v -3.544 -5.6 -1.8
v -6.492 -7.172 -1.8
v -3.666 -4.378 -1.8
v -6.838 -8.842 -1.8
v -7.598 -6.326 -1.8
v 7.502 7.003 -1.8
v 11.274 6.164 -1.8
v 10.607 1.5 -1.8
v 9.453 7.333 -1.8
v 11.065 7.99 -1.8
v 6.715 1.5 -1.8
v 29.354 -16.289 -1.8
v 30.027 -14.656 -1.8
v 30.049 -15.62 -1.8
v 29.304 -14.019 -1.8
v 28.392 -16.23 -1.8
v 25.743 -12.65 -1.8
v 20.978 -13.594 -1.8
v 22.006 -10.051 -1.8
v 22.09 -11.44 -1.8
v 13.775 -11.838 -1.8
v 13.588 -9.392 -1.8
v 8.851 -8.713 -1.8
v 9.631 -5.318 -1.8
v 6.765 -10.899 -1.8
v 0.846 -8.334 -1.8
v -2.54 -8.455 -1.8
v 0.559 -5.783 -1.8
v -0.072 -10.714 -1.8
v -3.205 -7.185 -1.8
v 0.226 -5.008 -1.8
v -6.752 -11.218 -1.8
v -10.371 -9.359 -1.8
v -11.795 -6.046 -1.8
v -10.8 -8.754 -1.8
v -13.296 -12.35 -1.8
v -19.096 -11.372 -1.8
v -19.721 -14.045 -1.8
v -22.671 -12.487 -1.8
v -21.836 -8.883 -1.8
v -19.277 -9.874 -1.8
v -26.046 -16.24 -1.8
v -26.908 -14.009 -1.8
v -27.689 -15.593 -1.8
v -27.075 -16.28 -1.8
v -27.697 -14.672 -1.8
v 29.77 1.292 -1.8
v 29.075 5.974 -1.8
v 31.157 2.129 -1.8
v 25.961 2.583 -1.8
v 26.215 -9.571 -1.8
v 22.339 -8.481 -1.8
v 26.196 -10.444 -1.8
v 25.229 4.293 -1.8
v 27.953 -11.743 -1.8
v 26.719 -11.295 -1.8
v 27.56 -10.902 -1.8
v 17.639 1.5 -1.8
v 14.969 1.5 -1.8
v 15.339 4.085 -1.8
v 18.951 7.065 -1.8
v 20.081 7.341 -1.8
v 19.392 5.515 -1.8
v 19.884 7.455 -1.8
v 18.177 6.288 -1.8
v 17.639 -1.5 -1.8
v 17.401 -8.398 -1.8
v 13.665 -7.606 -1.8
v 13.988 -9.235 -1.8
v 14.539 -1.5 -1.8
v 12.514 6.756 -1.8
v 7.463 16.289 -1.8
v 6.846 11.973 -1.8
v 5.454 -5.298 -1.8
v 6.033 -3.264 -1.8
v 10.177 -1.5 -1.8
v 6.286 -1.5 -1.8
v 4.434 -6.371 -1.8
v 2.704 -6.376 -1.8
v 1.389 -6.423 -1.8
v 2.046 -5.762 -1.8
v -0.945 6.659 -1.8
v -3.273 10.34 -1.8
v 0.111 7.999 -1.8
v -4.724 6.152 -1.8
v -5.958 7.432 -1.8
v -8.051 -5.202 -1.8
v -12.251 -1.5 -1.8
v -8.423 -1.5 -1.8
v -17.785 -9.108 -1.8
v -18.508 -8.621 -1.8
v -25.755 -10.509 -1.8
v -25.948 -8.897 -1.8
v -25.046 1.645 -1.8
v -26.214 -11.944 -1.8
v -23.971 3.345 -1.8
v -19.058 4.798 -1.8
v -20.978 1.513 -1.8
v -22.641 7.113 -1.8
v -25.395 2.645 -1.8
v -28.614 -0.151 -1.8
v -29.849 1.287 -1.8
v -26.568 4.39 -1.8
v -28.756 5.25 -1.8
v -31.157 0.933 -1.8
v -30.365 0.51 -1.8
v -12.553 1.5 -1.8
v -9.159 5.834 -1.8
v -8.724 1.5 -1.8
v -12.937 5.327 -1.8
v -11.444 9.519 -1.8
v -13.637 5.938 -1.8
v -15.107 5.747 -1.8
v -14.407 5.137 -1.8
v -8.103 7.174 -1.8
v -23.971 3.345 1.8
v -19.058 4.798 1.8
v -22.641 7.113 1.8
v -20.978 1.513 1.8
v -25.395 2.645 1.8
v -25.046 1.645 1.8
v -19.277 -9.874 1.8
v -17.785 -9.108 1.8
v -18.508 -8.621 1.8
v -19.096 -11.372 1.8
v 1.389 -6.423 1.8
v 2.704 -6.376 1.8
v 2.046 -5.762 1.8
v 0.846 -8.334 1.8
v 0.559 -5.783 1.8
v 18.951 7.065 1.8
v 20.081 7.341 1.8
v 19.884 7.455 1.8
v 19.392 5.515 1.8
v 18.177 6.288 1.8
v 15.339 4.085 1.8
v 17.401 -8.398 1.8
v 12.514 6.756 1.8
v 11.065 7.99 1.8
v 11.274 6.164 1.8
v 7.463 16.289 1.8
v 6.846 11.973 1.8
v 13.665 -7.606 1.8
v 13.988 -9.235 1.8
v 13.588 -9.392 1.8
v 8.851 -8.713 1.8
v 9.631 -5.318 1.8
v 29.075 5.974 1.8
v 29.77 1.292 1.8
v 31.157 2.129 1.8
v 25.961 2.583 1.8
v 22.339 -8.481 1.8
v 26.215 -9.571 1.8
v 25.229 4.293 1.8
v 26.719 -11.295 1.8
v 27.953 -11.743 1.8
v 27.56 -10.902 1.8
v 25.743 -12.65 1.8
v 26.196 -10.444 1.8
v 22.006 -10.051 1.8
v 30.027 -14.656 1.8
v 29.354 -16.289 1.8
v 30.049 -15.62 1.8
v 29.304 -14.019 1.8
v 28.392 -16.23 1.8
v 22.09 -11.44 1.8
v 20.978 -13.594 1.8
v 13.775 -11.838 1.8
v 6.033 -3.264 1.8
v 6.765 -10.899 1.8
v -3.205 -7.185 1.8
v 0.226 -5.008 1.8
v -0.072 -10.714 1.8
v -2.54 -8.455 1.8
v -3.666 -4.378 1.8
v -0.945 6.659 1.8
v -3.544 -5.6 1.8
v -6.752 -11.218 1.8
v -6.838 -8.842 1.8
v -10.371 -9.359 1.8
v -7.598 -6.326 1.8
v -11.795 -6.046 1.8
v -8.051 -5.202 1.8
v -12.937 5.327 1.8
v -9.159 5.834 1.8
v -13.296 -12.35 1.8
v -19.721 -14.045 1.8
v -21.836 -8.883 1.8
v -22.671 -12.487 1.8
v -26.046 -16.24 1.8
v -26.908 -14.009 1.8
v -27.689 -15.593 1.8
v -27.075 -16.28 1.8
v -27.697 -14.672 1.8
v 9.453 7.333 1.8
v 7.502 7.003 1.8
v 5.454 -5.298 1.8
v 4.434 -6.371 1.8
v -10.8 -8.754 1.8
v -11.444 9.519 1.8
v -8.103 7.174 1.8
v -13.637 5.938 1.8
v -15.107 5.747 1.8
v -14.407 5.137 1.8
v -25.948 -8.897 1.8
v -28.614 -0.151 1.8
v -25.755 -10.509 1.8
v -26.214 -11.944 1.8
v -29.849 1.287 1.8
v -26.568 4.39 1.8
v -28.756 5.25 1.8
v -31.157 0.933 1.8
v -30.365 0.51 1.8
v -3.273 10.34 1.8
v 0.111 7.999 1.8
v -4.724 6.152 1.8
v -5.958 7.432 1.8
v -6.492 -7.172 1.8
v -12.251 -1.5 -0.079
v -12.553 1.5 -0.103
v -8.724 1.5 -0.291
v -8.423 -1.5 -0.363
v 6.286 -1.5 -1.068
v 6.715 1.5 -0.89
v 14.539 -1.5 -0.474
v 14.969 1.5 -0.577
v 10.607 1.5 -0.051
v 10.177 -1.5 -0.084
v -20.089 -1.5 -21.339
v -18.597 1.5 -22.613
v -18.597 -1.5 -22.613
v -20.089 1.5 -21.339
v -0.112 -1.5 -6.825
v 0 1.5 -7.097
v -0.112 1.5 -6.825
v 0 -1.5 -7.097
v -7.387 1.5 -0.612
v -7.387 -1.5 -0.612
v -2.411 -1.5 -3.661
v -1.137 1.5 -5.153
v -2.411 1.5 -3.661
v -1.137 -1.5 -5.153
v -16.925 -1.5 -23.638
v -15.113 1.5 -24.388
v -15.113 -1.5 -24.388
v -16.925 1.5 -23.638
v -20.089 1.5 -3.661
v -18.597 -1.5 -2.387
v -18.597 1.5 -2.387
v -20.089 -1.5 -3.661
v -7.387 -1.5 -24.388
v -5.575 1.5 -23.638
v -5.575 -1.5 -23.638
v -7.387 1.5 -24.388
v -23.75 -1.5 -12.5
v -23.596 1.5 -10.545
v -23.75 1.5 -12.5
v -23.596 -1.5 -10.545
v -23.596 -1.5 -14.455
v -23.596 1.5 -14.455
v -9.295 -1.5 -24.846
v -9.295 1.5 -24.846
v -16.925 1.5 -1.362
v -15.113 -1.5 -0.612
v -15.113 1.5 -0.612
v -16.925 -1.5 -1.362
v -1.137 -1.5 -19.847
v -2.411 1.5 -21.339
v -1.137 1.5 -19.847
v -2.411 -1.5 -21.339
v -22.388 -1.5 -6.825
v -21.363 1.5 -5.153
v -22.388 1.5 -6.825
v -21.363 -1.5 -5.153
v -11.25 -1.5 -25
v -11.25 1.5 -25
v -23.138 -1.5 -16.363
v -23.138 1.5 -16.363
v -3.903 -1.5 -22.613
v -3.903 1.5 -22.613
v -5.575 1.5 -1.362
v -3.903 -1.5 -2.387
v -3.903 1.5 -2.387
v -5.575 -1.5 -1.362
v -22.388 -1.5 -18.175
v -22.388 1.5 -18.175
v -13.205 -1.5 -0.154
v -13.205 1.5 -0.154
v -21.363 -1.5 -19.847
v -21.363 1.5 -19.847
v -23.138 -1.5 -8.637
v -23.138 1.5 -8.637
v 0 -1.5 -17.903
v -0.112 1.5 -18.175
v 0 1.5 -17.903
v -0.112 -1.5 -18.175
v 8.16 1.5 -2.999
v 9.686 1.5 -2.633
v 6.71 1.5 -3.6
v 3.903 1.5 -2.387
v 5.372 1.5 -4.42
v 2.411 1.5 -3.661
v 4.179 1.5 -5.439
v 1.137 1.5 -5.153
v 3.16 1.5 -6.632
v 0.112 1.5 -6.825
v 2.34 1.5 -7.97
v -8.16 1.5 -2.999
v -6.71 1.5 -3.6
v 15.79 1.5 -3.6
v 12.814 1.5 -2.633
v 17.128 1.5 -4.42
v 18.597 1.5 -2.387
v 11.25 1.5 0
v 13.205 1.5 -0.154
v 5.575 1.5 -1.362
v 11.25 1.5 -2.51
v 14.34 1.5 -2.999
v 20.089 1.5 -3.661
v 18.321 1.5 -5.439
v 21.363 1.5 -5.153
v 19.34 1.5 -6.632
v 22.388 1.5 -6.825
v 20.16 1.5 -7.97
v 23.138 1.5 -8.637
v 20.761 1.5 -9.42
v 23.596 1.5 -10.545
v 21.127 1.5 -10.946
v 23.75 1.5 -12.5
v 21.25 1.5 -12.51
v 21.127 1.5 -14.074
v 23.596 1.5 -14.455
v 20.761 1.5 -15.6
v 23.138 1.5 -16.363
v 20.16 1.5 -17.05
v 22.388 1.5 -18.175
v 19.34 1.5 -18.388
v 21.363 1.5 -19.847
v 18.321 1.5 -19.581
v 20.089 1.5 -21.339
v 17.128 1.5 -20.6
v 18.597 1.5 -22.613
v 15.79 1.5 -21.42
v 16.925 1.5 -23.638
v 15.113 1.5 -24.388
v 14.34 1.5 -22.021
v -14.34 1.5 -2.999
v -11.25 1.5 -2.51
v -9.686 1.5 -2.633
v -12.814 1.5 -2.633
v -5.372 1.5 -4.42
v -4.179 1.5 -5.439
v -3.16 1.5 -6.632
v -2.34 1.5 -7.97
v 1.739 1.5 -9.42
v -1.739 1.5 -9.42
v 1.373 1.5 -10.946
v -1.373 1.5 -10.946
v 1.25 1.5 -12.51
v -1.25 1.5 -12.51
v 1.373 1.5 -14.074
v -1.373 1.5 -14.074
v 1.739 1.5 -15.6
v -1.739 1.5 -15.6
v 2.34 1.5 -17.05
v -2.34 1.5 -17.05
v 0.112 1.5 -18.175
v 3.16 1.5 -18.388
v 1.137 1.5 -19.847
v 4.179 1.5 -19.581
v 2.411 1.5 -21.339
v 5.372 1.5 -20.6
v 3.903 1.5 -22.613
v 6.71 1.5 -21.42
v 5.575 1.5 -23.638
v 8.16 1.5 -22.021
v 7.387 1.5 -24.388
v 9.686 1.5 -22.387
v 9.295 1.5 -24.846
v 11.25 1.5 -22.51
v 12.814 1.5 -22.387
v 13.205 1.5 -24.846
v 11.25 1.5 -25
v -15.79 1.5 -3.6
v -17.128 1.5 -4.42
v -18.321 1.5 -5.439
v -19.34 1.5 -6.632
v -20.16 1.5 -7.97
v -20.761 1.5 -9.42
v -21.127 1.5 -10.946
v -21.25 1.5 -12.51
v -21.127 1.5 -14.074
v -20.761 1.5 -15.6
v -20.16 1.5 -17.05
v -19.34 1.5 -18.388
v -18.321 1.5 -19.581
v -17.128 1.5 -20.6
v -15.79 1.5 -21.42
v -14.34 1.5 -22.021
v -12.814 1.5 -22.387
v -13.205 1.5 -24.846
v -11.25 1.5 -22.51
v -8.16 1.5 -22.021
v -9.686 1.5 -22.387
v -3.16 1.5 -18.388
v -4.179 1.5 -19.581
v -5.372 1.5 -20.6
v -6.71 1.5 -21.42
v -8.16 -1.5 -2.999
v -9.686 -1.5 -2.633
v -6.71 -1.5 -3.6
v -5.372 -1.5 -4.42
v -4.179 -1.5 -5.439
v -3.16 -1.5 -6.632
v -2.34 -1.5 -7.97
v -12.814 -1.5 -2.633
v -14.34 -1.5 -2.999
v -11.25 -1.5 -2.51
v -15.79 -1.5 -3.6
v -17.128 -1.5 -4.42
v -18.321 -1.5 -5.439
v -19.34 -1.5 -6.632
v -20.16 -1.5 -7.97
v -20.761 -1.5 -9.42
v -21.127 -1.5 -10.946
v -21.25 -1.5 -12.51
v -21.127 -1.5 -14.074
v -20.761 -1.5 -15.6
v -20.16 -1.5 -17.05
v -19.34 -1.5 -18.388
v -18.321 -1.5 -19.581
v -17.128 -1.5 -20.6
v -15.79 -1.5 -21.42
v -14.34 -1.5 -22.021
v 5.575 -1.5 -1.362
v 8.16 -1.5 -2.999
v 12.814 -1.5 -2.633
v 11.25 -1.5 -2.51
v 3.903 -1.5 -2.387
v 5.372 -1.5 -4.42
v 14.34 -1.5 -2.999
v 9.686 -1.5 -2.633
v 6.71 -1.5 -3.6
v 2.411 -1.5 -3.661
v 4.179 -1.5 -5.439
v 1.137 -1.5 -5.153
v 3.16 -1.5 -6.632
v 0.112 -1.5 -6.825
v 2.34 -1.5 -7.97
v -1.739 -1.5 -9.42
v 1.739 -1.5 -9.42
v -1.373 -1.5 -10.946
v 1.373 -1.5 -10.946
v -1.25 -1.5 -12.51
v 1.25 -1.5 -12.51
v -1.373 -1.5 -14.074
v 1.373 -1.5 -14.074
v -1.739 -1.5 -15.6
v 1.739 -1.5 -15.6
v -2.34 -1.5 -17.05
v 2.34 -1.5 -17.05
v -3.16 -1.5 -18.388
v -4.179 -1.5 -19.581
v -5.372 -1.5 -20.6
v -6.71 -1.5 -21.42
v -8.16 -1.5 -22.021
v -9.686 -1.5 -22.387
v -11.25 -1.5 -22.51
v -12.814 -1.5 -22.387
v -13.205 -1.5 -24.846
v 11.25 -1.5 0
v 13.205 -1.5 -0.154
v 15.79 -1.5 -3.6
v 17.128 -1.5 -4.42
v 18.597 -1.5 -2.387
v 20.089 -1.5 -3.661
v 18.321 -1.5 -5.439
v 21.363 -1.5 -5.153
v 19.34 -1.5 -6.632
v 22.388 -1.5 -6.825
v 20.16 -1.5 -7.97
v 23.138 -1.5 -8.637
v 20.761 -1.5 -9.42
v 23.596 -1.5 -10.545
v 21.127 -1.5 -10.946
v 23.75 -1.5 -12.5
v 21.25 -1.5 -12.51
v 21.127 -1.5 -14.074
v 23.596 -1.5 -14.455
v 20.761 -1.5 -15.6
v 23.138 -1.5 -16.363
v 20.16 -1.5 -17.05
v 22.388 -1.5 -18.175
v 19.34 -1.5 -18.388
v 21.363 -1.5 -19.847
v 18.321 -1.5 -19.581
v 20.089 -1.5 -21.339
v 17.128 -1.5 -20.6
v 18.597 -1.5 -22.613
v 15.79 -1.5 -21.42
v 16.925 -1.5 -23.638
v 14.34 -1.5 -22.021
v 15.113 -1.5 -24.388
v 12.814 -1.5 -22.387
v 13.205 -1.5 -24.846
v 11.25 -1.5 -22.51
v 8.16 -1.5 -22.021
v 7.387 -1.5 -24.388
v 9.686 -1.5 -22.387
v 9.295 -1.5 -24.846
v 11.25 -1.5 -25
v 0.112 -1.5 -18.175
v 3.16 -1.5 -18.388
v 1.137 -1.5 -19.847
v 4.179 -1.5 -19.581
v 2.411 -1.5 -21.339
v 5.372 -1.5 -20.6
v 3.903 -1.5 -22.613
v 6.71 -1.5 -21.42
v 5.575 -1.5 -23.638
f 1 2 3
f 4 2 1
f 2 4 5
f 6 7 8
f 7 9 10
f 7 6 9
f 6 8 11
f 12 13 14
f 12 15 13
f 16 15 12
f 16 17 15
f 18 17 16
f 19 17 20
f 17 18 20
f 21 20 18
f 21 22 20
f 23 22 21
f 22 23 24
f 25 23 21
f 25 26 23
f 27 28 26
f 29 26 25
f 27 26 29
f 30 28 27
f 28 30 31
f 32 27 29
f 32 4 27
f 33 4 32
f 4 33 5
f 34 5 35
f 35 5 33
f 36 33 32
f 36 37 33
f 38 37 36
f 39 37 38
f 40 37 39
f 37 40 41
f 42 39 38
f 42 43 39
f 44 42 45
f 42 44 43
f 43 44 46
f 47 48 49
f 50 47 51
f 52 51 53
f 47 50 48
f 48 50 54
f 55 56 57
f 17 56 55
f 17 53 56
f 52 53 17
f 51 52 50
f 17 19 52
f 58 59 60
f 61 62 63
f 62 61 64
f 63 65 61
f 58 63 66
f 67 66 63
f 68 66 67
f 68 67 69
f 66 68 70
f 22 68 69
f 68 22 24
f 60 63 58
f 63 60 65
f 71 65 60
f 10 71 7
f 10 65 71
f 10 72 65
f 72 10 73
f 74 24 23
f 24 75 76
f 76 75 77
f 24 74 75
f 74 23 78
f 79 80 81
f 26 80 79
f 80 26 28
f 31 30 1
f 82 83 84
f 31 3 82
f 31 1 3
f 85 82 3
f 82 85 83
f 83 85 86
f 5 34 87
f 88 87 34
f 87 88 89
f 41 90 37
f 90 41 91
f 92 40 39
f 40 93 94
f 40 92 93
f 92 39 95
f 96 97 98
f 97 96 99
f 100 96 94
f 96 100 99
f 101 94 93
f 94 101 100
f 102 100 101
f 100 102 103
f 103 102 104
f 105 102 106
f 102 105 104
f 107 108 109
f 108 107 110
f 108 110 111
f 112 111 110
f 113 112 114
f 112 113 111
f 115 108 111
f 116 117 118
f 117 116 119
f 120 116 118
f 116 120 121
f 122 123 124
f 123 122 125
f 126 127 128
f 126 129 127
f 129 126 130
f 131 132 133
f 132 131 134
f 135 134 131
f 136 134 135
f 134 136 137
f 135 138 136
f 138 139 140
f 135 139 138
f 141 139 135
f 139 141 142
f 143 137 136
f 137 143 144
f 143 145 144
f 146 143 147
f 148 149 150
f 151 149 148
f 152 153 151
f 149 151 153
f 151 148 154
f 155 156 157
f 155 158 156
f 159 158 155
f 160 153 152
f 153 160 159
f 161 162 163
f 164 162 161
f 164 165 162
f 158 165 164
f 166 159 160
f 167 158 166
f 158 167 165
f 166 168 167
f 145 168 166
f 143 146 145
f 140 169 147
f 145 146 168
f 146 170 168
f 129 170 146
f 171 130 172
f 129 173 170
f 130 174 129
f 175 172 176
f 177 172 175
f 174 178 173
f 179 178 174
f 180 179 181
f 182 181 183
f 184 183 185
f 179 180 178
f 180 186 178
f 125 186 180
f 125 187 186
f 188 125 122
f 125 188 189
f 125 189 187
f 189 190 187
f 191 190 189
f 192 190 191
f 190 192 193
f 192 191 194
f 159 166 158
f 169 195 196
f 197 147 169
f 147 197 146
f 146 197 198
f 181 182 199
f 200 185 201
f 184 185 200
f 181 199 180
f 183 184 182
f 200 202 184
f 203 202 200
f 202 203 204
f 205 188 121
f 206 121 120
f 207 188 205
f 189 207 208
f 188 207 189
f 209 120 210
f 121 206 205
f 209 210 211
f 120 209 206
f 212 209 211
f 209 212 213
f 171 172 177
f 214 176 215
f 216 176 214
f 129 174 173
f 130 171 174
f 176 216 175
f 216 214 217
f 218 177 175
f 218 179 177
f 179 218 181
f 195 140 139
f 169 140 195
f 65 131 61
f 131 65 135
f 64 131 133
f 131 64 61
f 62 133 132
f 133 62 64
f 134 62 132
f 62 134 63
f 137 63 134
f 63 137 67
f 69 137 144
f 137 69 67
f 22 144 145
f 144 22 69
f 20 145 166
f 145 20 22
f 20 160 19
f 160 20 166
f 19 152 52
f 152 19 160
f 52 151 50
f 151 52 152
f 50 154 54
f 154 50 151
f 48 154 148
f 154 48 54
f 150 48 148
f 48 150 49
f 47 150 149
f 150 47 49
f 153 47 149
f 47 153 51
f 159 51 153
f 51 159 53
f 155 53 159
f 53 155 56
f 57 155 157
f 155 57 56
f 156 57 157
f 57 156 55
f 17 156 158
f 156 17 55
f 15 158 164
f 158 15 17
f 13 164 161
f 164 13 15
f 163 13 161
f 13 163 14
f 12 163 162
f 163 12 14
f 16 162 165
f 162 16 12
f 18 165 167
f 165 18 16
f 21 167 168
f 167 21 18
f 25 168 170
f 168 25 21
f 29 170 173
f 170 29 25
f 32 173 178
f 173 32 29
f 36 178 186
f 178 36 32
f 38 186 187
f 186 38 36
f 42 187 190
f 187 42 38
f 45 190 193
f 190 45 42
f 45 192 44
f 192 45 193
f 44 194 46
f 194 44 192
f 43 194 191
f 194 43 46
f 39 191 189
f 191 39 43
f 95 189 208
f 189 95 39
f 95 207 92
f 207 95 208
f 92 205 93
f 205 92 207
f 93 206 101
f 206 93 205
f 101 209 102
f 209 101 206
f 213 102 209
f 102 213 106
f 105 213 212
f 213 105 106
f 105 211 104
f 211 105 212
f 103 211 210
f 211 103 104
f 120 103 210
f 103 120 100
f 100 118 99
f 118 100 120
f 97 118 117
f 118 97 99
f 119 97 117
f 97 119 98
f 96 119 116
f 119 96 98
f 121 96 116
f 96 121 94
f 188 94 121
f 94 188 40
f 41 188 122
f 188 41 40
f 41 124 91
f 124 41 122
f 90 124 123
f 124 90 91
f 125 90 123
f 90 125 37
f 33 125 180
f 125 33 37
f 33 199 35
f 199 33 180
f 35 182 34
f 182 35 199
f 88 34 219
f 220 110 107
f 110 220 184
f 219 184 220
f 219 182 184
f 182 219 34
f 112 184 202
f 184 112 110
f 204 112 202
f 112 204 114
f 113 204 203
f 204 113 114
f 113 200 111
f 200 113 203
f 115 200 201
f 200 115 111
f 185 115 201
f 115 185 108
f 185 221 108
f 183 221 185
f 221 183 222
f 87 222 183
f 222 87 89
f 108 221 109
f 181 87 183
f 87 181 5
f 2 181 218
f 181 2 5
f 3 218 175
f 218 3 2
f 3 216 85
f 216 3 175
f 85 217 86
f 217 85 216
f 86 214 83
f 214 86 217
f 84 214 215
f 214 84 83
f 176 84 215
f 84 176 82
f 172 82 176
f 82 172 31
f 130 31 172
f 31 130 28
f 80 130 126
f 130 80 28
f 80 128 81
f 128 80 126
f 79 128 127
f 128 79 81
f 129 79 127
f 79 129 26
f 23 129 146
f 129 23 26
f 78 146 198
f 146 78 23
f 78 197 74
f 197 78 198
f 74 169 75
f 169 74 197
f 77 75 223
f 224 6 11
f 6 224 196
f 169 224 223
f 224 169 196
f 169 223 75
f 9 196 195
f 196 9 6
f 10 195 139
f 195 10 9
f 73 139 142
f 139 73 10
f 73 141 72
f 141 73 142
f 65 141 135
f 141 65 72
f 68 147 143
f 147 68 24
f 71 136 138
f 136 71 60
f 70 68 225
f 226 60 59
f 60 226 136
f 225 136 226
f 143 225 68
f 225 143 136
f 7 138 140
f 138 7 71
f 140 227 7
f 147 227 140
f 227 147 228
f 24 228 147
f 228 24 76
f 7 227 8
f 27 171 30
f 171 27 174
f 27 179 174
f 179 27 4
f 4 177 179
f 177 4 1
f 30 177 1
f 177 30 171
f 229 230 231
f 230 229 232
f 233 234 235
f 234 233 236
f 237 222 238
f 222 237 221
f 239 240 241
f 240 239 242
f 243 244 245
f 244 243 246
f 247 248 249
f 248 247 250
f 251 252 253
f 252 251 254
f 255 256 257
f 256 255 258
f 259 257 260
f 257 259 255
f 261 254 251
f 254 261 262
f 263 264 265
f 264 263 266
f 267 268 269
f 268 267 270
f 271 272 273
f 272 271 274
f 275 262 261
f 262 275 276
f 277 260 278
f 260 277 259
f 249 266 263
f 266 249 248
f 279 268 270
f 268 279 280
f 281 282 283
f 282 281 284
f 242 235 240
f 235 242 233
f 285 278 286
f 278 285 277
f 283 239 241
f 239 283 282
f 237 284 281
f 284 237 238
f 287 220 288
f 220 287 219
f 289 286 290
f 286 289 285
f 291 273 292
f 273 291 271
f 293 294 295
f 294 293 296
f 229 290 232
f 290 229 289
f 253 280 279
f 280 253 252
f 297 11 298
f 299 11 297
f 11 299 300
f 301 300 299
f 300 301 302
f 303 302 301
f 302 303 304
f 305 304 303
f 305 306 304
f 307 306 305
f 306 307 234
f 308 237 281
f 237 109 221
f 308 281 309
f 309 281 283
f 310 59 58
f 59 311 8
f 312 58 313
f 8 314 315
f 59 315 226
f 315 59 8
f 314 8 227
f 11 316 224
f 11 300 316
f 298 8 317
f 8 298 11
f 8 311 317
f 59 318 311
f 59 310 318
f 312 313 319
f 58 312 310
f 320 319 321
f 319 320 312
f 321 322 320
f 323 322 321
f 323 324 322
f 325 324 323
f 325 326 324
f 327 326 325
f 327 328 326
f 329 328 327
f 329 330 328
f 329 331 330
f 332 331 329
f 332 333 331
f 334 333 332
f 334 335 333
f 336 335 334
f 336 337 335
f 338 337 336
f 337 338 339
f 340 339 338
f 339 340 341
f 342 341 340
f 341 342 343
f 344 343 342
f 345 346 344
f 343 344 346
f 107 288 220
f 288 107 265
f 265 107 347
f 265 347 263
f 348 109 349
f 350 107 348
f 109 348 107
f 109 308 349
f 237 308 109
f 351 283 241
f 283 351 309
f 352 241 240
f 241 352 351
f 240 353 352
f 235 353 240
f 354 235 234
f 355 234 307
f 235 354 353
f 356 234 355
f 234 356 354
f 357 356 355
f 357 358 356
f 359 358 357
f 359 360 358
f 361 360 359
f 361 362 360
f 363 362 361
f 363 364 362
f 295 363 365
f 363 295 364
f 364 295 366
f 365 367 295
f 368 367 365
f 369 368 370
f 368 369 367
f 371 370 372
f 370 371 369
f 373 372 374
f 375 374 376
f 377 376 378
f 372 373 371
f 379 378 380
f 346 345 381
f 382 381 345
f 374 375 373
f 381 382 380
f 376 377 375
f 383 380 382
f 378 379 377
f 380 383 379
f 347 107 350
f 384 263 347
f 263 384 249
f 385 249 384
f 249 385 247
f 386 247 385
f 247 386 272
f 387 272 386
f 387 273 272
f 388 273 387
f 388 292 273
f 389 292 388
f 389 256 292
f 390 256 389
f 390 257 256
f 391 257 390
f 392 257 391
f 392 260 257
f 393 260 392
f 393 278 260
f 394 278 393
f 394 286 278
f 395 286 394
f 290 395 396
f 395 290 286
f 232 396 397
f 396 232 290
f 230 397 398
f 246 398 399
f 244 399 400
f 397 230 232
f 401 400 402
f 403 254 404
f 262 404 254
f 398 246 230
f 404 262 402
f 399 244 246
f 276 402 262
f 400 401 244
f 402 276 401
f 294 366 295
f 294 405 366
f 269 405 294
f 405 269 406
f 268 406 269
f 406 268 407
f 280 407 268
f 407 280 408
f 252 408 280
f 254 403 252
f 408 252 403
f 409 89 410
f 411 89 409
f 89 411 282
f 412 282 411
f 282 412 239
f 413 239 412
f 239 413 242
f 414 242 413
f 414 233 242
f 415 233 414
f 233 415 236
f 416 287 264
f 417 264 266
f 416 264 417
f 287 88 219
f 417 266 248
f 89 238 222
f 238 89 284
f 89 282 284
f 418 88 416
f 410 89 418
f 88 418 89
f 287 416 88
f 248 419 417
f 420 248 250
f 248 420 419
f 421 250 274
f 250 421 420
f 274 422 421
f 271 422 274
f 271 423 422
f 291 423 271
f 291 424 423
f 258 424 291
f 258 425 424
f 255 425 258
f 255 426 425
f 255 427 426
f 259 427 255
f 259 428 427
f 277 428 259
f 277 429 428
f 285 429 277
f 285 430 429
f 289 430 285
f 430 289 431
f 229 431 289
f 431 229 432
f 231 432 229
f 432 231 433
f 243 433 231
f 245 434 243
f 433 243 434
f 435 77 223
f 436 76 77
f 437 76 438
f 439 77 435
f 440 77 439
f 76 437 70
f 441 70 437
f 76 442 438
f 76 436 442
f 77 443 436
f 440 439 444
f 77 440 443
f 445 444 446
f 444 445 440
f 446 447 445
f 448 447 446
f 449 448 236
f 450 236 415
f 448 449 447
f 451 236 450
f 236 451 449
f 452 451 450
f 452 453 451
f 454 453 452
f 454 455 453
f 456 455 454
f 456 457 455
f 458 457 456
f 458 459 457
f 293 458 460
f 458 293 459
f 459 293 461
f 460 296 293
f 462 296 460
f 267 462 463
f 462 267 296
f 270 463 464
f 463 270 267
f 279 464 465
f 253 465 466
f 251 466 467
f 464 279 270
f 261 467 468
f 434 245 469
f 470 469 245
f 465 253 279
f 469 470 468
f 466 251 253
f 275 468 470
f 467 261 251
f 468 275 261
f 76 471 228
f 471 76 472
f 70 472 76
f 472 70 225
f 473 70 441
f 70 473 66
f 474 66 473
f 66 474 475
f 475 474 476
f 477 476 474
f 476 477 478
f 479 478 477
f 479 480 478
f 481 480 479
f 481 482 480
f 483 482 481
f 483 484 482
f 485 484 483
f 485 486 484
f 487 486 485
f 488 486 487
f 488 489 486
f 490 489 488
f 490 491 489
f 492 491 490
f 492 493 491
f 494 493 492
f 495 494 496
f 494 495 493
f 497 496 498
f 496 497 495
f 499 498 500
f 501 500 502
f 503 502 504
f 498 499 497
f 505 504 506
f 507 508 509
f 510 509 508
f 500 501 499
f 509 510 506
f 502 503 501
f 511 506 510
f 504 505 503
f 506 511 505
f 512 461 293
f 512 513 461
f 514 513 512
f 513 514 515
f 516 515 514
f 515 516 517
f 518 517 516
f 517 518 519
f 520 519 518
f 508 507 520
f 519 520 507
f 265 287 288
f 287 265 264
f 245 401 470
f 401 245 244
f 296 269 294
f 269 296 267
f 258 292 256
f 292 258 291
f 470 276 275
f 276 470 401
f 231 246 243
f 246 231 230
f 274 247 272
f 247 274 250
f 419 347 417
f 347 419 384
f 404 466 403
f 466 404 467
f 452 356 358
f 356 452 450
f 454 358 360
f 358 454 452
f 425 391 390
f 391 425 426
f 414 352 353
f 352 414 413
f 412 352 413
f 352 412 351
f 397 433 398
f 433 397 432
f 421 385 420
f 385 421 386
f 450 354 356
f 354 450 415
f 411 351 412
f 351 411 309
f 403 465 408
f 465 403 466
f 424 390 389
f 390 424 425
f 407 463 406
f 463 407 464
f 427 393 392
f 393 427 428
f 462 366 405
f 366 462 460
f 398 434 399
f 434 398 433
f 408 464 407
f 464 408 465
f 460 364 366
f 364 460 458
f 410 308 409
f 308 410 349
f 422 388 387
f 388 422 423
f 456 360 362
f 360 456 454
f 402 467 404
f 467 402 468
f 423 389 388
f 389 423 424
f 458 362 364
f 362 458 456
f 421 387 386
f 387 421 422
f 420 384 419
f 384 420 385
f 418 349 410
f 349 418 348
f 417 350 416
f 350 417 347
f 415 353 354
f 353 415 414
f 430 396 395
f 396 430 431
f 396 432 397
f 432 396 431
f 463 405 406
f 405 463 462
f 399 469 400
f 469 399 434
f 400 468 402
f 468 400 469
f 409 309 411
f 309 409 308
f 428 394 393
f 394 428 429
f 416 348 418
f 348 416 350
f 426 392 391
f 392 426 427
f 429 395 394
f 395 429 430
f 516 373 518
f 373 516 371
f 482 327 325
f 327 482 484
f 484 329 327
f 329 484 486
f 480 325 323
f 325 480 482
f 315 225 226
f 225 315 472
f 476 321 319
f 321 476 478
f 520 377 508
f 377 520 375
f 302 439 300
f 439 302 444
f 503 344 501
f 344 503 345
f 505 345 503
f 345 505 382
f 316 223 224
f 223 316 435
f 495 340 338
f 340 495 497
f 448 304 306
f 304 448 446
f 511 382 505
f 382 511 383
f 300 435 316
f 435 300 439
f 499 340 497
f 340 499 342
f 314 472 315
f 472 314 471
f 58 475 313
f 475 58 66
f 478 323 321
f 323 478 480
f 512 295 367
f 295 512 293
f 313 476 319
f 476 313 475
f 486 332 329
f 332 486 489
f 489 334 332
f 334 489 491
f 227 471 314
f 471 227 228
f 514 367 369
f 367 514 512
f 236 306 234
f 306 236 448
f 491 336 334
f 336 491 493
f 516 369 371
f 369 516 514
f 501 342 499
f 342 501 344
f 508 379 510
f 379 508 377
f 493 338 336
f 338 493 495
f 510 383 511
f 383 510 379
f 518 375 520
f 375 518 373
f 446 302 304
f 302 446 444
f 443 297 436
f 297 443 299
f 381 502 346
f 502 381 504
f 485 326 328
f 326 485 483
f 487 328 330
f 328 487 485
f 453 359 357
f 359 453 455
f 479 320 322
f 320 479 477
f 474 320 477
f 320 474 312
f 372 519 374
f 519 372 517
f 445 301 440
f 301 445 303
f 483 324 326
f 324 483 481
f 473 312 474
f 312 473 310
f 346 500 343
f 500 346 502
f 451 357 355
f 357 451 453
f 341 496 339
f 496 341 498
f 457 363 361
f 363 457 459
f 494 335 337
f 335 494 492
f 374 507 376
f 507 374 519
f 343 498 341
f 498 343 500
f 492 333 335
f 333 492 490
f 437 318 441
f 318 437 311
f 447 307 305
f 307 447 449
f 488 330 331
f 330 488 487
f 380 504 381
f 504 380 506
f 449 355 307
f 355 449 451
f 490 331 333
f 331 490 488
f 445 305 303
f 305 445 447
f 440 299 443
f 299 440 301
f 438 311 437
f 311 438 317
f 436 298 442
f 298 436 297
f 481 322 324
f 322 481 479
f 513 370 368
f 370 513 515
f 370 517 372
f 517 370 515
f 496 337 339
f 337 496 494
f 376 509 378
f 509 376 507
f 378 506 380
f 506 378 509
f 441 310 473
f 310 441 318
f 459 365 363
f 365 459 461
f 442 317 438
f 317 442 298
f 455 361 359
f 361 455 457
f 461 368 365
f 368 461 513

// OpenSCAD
fw = 20; // finger width
rw = 25; // ring width
rh = 5; // ring height
th = 3; // text height

slack = 0.1;

// ------------------------------

rt = (rw-fw)/2; // ring thickness

$fn = 40;
e = 0.01;


module ring(h) {
    rotate([90, 0, 0])
    difference() {
        cylinder(d=rw, h=h, center = true);
        translate([0, -e, 0])
        cylinder(d=fw, h=h+2*e, center = true);
    }
}

//snap()
full()
//csumi(th)
rudi(th);

module full() {
    scale(1.2)
    children();
    translate([-rw/2+rt/2, 0, -rw/2])
    ring(th);
    translate([rw/2-rt/2, 0, -rw/2])
    ring(th);
}

module snap() {
    difference() {
        scale(1.2)
        children();
        translate([-rw/2+rt/2, 0, -rw/2])
        ring(th+2*slack);
        translate([rw/2-rt/2, 0, -rw/2])
        ring(th+2*slack);
    }
}

module rings_snap() {
    translate([-rw/2+rt/2, 0, -rw/2])
    ring(th);
    translate([rw/2-rt/2, 0, -rw/2])
    ring(th);
}


fudge = 0.1;
module csumi(h=3)
{
    translate([0, 0, -h/2])
  scale([1, -1, 1]) union()
  {
    difference()
    {
       linear_extrude(height=h)
         polygon([[-13.610023,-12.008821],[-13.884425,-12.004693],[-14.504789,-11.729996],[-14.679209,-11.072968],[-14.480255,-10.673508],[-14.101466,-10.264232],[-13.727846,-9.889061],[-13.538710,-9.559882],[-13.922046,-8.552732],[-15.287440,-8.065915],[-17.438703,-8.162474],[-19.821014,-8.885504],[-21.341798,-6.978378],[-23.423379,-5.383910],[-22.643581,0.135135],[-19.163173,1.567089],[-22.032766,7.341930],[-25.455296,8.111910],[-23.636802,5.596299],[-24.217129,5.204594],[-25.311119,6.704760],[-28.335224,6.056738],[-30.965555,-3.719927],[-27.659296,-2.563925],[-26.824205,-5.163250],[-30.829128,-6.606574],[-32.178269,-4.526426],[-34.013431,-2.826958],[-31.630113,6.030382],[-31.460622,7.610520],[-31.905549,8.807992],[-28.865941,9.011081],[-32.384073,10.082850],[-33.025774,10.608346],[-33.053909,11.352883],[-32.592096,11.937568],[-31.763955,11.983508],[-23.792830,9.766351],[-15.797137,8.296937],[-7.777492,7.518585],[0.265491,7.374610],[8.331194,7.808330],[16.419002,8.763062],[24.528301,10.182122],[32.658473,12.008828],[33.461765,11.884950],[33.869250,11.277091],[33.791106,10.549471],[33.137514,10.066313],[30.731975,9.489087],[32.463652,8.575447],[32.070913,7.908821],[31.404287,8.302079],[30.902113,7.638238],[30.847731,6.911982],[32.929258,-2.382540],[34.013431,-3.188178],[31.978412,-6.210733],[28.922268,-4.509026],[29.666408,-3.149419],[27.546640,6.317704],[27.394715,7.637978],[27.570400,8.776985],[23.403212,7.925873],[25.336946,6.644298],[24.886845,6.015396],[24.257425,6.465498],[23.701009,5.831296],[23.589765,5.060415],[24.767989,-3.822247],[25.753459,-5.079533],[26.507934,-5.940464],[26.122944,-6.525442],[24.547847,-5.381841],[22.685945,-7.977549],[19.871128,-6.073271],[17.972020,-4.901768],[17.572583,-7.054278],[16.409840,-8.952166],[11.217911,-5.762180],[11.260026,-7.002152],[11.003519,-8.103826],[10.448419,-9.067173],[9.594753,-9.892162],[6.500368,-7.490758],[6.915846,-6.866506],[7.575238,-7.277332],[7.962684,-6.576445],[8.023789,-5.829876],[6.794924,3.437775],[5.641504,4.352448],[6.769603,5.683117],[2.731087,5.455223],[4.298953,4.081665],[3.800790,3.520976],[3.204962,4.019652],[2.565186,3.425141],[2.348167,2.756679],[2.269617,-7.014818],[3.249404,-8.045761],[0.621138,-10.247177],[-1.830906,-8.040594],[-0.904349,-6.883558],[-0.833551,1.935542],[-3.392051,4.037223],[-4.245099,3.250471],[-4.535136,2.282808],[-4.609032,-6.960041],[-3.629764,-7.990985],[-6.222887,-10.192400],[-9.551367,-7.343478],[-9.017548,-6.783307],[-8.316815,-7.388439],[-7.783516,-6.828265],[-7.707035,2.696219],[-7.088469,5.019592],[-6.826986,5.477962],[-13.740775,6.026766],[-11.300098,4.517812],[-12.218388,-1.979466],[-15.713265,-3.516322],[-14.247205,-6.253106],[-13.731990,-7.145559],[-12.814679,-9.288046],[-12.594075,-10.940160],[-12.904024,-11.713885],[-13.610034,-12.008828]]);
       translate([0, 0, -fudge])
         linear_extrude(height=h+2*fudge)
           polygon([[13.919047,-6.542486],[14.619647,-5.586564],[14.785145,-4.754998],[13.579015,4.337470],[12.495877,5.261445],[13.413651,6.342517],[9.502778,5.914635],[10.707873,5.059907],[9.951332,3.785049],[11.092347,-4.818043]]);
       translate([0, 0, -fudge])
         linear_extrude(height=h+2*fudge)
           polygon([[-15.410430,-5.910484],[-17.827337,-1.079771],[-19.821531,-1.831146],[-20.394623,-5.883094],[-18.905852,-5.434376],[-17.401523,-5.379767],[-15.410430,-5.910484]]);
       translate([0, 0, -fudge])
         linear_extrude(height=h+2*fudge)
           polygon([[20.365682,-5.509473],[21.583696,-3.960216],[20.419426,4.817546],[20.393225,6.239441],[20.721734,7.433404],[16.366959,6.738357],[17.496609,5.924970],[16.740580,4.650112],[17.895550,-4.057884]]);
       translate([0, 0, -fudge])
         linear_extrude(height=h+2*fudge)
           polygon([[-17.039272,-0.799167],[-15.035259,0.021972],[-14.378452,4.667683],[-16.168583,4.038871],[-17.929657,3.993821],[-19.926434,4.738996]]);
       translate([0, 0, -fudge])
         linear_extrude(height=h+2*fudge)
           polygon([[-0.825273,2.958744],[-0.670062,4.281994],[-0.229444,5.375134],[-3.782717,5.377250]]);
    }
  }
}

module rudi(h=3)
{
    translate([0, 0, -h/2])
  scale([1, -1, 1]) union()
  {
    difference()
    {
       linear_extrude(height=h)
         polygon([[6.219517,-13.573799],[5.704821,-9.977116],[9.220885,-6.658458],[7.877382,-6.111123],[6.252074,-5.835768],[5.027858,2.719784],[4.544729,4.414697],[3.695125,5.308771],[7.375519,7.260592],[0.704608,6.945365],[2.253352,5.313423],[1.705064,4.801308],[1.157810,5.352697],[0.466004,4.819324],[0.188361,4.173442],[-0.787806,-5.549481],[0.092759,-6.666208],[-2.727223,-8.616478],[-4.965331,-6.193368],[-3.936454,-5.126766],[-3.055370,3.648408],[-5.409747,5.976948],[-6.331316,5.271767],[-6.708893,4.334671],[-7.632869,-4.861667],[-6.752301,-5.978394],[-9.536628,-7.932797],[-12.589155,-4.789319],[-12.006246,-4.280825],[-11.364422,-4.947966],[-10.780998,-4.439472],[-9.829117,5.037989],[-8.999709,7.294697],[-8.642624,7.799059],[-15.913499,9.476478],[-14.820543,7.590287],[-15.423607,7.184109],[-16.064396,8.227975],[-18.197081,7.402703],[-20.871336,-1.370924],[-19.975785,-2.787376],[-17.481881,-1.260854],[-15.881977,-3.998154],[-18.867842,-5.927753],[-21.162275,-2.204465],[-22.140272,-3.658168],[-23.963138,-4.374876],[-25.964566,-0.777162],[-25.304142,-0.425245],[-24.874194,-1.072752],[-23.845317,0.125626],[-21.623229,7.414588],[-21.462580,8.757740],[-21.844921,9.952934],[-18.892647,10.405618],[-22.423697,11.674276],[-23.080578,12.226276],[-23.073786,12.994212],[-22.562245,13.567009],[-21.704877,13.533594],[-16.433875,11.704182],[-11.079637,10.291575],[-5.626698,9.348567],[-0.059593,8.927953],[5.637143,9.082528],[11.478977,9.865088],[17.481374,11.328426],[23.659799,13.525339],[24.461692,13.573799],[25.040524,13.016719],[25.022800,12.213560],[24.419957,11.682558],[21.452181,10.542058],[23.293928,9.786032],[22.966818,9.085299],[22.265569,9.412412],[21.829646,8.703697],[21.845437,7.975806],[24.808564,-1.076871],[25.964566,-1.774503],[24.229272,-4.978444],[21.024300,-3.577493],[21.634082,-2.152775],[18.616179,7.067335],[18.337993,8.375952],[18.408438,9.533334],[11.323600,7.826462],[11.656911,7.695721],[14.500667,6.998088],[16.159996,-4.596036],[16.734120,-6.117390],[16.569790,-6.212476],[15.792663,-5.887115],[15.147655,-5.239926]]);
       translate([0, 0, -fudge])
         linear_extrude(height=h+2*fudge)
           polygon([[10.428046,-5.630097],[12.782425,-3.404392],[11.387677,6.338683],[8.025608,4.431823],[9.395033,-5.136585]]);
       translate([0, 0, -fudge])
         linear_extrude(height=h+2*fudge)
           polygon([[-2.953051,4.666434],[-2.670480,5.987574],[-2.116925,7.045618],[-5.698103,7.368595]]);
    }
  }
}
